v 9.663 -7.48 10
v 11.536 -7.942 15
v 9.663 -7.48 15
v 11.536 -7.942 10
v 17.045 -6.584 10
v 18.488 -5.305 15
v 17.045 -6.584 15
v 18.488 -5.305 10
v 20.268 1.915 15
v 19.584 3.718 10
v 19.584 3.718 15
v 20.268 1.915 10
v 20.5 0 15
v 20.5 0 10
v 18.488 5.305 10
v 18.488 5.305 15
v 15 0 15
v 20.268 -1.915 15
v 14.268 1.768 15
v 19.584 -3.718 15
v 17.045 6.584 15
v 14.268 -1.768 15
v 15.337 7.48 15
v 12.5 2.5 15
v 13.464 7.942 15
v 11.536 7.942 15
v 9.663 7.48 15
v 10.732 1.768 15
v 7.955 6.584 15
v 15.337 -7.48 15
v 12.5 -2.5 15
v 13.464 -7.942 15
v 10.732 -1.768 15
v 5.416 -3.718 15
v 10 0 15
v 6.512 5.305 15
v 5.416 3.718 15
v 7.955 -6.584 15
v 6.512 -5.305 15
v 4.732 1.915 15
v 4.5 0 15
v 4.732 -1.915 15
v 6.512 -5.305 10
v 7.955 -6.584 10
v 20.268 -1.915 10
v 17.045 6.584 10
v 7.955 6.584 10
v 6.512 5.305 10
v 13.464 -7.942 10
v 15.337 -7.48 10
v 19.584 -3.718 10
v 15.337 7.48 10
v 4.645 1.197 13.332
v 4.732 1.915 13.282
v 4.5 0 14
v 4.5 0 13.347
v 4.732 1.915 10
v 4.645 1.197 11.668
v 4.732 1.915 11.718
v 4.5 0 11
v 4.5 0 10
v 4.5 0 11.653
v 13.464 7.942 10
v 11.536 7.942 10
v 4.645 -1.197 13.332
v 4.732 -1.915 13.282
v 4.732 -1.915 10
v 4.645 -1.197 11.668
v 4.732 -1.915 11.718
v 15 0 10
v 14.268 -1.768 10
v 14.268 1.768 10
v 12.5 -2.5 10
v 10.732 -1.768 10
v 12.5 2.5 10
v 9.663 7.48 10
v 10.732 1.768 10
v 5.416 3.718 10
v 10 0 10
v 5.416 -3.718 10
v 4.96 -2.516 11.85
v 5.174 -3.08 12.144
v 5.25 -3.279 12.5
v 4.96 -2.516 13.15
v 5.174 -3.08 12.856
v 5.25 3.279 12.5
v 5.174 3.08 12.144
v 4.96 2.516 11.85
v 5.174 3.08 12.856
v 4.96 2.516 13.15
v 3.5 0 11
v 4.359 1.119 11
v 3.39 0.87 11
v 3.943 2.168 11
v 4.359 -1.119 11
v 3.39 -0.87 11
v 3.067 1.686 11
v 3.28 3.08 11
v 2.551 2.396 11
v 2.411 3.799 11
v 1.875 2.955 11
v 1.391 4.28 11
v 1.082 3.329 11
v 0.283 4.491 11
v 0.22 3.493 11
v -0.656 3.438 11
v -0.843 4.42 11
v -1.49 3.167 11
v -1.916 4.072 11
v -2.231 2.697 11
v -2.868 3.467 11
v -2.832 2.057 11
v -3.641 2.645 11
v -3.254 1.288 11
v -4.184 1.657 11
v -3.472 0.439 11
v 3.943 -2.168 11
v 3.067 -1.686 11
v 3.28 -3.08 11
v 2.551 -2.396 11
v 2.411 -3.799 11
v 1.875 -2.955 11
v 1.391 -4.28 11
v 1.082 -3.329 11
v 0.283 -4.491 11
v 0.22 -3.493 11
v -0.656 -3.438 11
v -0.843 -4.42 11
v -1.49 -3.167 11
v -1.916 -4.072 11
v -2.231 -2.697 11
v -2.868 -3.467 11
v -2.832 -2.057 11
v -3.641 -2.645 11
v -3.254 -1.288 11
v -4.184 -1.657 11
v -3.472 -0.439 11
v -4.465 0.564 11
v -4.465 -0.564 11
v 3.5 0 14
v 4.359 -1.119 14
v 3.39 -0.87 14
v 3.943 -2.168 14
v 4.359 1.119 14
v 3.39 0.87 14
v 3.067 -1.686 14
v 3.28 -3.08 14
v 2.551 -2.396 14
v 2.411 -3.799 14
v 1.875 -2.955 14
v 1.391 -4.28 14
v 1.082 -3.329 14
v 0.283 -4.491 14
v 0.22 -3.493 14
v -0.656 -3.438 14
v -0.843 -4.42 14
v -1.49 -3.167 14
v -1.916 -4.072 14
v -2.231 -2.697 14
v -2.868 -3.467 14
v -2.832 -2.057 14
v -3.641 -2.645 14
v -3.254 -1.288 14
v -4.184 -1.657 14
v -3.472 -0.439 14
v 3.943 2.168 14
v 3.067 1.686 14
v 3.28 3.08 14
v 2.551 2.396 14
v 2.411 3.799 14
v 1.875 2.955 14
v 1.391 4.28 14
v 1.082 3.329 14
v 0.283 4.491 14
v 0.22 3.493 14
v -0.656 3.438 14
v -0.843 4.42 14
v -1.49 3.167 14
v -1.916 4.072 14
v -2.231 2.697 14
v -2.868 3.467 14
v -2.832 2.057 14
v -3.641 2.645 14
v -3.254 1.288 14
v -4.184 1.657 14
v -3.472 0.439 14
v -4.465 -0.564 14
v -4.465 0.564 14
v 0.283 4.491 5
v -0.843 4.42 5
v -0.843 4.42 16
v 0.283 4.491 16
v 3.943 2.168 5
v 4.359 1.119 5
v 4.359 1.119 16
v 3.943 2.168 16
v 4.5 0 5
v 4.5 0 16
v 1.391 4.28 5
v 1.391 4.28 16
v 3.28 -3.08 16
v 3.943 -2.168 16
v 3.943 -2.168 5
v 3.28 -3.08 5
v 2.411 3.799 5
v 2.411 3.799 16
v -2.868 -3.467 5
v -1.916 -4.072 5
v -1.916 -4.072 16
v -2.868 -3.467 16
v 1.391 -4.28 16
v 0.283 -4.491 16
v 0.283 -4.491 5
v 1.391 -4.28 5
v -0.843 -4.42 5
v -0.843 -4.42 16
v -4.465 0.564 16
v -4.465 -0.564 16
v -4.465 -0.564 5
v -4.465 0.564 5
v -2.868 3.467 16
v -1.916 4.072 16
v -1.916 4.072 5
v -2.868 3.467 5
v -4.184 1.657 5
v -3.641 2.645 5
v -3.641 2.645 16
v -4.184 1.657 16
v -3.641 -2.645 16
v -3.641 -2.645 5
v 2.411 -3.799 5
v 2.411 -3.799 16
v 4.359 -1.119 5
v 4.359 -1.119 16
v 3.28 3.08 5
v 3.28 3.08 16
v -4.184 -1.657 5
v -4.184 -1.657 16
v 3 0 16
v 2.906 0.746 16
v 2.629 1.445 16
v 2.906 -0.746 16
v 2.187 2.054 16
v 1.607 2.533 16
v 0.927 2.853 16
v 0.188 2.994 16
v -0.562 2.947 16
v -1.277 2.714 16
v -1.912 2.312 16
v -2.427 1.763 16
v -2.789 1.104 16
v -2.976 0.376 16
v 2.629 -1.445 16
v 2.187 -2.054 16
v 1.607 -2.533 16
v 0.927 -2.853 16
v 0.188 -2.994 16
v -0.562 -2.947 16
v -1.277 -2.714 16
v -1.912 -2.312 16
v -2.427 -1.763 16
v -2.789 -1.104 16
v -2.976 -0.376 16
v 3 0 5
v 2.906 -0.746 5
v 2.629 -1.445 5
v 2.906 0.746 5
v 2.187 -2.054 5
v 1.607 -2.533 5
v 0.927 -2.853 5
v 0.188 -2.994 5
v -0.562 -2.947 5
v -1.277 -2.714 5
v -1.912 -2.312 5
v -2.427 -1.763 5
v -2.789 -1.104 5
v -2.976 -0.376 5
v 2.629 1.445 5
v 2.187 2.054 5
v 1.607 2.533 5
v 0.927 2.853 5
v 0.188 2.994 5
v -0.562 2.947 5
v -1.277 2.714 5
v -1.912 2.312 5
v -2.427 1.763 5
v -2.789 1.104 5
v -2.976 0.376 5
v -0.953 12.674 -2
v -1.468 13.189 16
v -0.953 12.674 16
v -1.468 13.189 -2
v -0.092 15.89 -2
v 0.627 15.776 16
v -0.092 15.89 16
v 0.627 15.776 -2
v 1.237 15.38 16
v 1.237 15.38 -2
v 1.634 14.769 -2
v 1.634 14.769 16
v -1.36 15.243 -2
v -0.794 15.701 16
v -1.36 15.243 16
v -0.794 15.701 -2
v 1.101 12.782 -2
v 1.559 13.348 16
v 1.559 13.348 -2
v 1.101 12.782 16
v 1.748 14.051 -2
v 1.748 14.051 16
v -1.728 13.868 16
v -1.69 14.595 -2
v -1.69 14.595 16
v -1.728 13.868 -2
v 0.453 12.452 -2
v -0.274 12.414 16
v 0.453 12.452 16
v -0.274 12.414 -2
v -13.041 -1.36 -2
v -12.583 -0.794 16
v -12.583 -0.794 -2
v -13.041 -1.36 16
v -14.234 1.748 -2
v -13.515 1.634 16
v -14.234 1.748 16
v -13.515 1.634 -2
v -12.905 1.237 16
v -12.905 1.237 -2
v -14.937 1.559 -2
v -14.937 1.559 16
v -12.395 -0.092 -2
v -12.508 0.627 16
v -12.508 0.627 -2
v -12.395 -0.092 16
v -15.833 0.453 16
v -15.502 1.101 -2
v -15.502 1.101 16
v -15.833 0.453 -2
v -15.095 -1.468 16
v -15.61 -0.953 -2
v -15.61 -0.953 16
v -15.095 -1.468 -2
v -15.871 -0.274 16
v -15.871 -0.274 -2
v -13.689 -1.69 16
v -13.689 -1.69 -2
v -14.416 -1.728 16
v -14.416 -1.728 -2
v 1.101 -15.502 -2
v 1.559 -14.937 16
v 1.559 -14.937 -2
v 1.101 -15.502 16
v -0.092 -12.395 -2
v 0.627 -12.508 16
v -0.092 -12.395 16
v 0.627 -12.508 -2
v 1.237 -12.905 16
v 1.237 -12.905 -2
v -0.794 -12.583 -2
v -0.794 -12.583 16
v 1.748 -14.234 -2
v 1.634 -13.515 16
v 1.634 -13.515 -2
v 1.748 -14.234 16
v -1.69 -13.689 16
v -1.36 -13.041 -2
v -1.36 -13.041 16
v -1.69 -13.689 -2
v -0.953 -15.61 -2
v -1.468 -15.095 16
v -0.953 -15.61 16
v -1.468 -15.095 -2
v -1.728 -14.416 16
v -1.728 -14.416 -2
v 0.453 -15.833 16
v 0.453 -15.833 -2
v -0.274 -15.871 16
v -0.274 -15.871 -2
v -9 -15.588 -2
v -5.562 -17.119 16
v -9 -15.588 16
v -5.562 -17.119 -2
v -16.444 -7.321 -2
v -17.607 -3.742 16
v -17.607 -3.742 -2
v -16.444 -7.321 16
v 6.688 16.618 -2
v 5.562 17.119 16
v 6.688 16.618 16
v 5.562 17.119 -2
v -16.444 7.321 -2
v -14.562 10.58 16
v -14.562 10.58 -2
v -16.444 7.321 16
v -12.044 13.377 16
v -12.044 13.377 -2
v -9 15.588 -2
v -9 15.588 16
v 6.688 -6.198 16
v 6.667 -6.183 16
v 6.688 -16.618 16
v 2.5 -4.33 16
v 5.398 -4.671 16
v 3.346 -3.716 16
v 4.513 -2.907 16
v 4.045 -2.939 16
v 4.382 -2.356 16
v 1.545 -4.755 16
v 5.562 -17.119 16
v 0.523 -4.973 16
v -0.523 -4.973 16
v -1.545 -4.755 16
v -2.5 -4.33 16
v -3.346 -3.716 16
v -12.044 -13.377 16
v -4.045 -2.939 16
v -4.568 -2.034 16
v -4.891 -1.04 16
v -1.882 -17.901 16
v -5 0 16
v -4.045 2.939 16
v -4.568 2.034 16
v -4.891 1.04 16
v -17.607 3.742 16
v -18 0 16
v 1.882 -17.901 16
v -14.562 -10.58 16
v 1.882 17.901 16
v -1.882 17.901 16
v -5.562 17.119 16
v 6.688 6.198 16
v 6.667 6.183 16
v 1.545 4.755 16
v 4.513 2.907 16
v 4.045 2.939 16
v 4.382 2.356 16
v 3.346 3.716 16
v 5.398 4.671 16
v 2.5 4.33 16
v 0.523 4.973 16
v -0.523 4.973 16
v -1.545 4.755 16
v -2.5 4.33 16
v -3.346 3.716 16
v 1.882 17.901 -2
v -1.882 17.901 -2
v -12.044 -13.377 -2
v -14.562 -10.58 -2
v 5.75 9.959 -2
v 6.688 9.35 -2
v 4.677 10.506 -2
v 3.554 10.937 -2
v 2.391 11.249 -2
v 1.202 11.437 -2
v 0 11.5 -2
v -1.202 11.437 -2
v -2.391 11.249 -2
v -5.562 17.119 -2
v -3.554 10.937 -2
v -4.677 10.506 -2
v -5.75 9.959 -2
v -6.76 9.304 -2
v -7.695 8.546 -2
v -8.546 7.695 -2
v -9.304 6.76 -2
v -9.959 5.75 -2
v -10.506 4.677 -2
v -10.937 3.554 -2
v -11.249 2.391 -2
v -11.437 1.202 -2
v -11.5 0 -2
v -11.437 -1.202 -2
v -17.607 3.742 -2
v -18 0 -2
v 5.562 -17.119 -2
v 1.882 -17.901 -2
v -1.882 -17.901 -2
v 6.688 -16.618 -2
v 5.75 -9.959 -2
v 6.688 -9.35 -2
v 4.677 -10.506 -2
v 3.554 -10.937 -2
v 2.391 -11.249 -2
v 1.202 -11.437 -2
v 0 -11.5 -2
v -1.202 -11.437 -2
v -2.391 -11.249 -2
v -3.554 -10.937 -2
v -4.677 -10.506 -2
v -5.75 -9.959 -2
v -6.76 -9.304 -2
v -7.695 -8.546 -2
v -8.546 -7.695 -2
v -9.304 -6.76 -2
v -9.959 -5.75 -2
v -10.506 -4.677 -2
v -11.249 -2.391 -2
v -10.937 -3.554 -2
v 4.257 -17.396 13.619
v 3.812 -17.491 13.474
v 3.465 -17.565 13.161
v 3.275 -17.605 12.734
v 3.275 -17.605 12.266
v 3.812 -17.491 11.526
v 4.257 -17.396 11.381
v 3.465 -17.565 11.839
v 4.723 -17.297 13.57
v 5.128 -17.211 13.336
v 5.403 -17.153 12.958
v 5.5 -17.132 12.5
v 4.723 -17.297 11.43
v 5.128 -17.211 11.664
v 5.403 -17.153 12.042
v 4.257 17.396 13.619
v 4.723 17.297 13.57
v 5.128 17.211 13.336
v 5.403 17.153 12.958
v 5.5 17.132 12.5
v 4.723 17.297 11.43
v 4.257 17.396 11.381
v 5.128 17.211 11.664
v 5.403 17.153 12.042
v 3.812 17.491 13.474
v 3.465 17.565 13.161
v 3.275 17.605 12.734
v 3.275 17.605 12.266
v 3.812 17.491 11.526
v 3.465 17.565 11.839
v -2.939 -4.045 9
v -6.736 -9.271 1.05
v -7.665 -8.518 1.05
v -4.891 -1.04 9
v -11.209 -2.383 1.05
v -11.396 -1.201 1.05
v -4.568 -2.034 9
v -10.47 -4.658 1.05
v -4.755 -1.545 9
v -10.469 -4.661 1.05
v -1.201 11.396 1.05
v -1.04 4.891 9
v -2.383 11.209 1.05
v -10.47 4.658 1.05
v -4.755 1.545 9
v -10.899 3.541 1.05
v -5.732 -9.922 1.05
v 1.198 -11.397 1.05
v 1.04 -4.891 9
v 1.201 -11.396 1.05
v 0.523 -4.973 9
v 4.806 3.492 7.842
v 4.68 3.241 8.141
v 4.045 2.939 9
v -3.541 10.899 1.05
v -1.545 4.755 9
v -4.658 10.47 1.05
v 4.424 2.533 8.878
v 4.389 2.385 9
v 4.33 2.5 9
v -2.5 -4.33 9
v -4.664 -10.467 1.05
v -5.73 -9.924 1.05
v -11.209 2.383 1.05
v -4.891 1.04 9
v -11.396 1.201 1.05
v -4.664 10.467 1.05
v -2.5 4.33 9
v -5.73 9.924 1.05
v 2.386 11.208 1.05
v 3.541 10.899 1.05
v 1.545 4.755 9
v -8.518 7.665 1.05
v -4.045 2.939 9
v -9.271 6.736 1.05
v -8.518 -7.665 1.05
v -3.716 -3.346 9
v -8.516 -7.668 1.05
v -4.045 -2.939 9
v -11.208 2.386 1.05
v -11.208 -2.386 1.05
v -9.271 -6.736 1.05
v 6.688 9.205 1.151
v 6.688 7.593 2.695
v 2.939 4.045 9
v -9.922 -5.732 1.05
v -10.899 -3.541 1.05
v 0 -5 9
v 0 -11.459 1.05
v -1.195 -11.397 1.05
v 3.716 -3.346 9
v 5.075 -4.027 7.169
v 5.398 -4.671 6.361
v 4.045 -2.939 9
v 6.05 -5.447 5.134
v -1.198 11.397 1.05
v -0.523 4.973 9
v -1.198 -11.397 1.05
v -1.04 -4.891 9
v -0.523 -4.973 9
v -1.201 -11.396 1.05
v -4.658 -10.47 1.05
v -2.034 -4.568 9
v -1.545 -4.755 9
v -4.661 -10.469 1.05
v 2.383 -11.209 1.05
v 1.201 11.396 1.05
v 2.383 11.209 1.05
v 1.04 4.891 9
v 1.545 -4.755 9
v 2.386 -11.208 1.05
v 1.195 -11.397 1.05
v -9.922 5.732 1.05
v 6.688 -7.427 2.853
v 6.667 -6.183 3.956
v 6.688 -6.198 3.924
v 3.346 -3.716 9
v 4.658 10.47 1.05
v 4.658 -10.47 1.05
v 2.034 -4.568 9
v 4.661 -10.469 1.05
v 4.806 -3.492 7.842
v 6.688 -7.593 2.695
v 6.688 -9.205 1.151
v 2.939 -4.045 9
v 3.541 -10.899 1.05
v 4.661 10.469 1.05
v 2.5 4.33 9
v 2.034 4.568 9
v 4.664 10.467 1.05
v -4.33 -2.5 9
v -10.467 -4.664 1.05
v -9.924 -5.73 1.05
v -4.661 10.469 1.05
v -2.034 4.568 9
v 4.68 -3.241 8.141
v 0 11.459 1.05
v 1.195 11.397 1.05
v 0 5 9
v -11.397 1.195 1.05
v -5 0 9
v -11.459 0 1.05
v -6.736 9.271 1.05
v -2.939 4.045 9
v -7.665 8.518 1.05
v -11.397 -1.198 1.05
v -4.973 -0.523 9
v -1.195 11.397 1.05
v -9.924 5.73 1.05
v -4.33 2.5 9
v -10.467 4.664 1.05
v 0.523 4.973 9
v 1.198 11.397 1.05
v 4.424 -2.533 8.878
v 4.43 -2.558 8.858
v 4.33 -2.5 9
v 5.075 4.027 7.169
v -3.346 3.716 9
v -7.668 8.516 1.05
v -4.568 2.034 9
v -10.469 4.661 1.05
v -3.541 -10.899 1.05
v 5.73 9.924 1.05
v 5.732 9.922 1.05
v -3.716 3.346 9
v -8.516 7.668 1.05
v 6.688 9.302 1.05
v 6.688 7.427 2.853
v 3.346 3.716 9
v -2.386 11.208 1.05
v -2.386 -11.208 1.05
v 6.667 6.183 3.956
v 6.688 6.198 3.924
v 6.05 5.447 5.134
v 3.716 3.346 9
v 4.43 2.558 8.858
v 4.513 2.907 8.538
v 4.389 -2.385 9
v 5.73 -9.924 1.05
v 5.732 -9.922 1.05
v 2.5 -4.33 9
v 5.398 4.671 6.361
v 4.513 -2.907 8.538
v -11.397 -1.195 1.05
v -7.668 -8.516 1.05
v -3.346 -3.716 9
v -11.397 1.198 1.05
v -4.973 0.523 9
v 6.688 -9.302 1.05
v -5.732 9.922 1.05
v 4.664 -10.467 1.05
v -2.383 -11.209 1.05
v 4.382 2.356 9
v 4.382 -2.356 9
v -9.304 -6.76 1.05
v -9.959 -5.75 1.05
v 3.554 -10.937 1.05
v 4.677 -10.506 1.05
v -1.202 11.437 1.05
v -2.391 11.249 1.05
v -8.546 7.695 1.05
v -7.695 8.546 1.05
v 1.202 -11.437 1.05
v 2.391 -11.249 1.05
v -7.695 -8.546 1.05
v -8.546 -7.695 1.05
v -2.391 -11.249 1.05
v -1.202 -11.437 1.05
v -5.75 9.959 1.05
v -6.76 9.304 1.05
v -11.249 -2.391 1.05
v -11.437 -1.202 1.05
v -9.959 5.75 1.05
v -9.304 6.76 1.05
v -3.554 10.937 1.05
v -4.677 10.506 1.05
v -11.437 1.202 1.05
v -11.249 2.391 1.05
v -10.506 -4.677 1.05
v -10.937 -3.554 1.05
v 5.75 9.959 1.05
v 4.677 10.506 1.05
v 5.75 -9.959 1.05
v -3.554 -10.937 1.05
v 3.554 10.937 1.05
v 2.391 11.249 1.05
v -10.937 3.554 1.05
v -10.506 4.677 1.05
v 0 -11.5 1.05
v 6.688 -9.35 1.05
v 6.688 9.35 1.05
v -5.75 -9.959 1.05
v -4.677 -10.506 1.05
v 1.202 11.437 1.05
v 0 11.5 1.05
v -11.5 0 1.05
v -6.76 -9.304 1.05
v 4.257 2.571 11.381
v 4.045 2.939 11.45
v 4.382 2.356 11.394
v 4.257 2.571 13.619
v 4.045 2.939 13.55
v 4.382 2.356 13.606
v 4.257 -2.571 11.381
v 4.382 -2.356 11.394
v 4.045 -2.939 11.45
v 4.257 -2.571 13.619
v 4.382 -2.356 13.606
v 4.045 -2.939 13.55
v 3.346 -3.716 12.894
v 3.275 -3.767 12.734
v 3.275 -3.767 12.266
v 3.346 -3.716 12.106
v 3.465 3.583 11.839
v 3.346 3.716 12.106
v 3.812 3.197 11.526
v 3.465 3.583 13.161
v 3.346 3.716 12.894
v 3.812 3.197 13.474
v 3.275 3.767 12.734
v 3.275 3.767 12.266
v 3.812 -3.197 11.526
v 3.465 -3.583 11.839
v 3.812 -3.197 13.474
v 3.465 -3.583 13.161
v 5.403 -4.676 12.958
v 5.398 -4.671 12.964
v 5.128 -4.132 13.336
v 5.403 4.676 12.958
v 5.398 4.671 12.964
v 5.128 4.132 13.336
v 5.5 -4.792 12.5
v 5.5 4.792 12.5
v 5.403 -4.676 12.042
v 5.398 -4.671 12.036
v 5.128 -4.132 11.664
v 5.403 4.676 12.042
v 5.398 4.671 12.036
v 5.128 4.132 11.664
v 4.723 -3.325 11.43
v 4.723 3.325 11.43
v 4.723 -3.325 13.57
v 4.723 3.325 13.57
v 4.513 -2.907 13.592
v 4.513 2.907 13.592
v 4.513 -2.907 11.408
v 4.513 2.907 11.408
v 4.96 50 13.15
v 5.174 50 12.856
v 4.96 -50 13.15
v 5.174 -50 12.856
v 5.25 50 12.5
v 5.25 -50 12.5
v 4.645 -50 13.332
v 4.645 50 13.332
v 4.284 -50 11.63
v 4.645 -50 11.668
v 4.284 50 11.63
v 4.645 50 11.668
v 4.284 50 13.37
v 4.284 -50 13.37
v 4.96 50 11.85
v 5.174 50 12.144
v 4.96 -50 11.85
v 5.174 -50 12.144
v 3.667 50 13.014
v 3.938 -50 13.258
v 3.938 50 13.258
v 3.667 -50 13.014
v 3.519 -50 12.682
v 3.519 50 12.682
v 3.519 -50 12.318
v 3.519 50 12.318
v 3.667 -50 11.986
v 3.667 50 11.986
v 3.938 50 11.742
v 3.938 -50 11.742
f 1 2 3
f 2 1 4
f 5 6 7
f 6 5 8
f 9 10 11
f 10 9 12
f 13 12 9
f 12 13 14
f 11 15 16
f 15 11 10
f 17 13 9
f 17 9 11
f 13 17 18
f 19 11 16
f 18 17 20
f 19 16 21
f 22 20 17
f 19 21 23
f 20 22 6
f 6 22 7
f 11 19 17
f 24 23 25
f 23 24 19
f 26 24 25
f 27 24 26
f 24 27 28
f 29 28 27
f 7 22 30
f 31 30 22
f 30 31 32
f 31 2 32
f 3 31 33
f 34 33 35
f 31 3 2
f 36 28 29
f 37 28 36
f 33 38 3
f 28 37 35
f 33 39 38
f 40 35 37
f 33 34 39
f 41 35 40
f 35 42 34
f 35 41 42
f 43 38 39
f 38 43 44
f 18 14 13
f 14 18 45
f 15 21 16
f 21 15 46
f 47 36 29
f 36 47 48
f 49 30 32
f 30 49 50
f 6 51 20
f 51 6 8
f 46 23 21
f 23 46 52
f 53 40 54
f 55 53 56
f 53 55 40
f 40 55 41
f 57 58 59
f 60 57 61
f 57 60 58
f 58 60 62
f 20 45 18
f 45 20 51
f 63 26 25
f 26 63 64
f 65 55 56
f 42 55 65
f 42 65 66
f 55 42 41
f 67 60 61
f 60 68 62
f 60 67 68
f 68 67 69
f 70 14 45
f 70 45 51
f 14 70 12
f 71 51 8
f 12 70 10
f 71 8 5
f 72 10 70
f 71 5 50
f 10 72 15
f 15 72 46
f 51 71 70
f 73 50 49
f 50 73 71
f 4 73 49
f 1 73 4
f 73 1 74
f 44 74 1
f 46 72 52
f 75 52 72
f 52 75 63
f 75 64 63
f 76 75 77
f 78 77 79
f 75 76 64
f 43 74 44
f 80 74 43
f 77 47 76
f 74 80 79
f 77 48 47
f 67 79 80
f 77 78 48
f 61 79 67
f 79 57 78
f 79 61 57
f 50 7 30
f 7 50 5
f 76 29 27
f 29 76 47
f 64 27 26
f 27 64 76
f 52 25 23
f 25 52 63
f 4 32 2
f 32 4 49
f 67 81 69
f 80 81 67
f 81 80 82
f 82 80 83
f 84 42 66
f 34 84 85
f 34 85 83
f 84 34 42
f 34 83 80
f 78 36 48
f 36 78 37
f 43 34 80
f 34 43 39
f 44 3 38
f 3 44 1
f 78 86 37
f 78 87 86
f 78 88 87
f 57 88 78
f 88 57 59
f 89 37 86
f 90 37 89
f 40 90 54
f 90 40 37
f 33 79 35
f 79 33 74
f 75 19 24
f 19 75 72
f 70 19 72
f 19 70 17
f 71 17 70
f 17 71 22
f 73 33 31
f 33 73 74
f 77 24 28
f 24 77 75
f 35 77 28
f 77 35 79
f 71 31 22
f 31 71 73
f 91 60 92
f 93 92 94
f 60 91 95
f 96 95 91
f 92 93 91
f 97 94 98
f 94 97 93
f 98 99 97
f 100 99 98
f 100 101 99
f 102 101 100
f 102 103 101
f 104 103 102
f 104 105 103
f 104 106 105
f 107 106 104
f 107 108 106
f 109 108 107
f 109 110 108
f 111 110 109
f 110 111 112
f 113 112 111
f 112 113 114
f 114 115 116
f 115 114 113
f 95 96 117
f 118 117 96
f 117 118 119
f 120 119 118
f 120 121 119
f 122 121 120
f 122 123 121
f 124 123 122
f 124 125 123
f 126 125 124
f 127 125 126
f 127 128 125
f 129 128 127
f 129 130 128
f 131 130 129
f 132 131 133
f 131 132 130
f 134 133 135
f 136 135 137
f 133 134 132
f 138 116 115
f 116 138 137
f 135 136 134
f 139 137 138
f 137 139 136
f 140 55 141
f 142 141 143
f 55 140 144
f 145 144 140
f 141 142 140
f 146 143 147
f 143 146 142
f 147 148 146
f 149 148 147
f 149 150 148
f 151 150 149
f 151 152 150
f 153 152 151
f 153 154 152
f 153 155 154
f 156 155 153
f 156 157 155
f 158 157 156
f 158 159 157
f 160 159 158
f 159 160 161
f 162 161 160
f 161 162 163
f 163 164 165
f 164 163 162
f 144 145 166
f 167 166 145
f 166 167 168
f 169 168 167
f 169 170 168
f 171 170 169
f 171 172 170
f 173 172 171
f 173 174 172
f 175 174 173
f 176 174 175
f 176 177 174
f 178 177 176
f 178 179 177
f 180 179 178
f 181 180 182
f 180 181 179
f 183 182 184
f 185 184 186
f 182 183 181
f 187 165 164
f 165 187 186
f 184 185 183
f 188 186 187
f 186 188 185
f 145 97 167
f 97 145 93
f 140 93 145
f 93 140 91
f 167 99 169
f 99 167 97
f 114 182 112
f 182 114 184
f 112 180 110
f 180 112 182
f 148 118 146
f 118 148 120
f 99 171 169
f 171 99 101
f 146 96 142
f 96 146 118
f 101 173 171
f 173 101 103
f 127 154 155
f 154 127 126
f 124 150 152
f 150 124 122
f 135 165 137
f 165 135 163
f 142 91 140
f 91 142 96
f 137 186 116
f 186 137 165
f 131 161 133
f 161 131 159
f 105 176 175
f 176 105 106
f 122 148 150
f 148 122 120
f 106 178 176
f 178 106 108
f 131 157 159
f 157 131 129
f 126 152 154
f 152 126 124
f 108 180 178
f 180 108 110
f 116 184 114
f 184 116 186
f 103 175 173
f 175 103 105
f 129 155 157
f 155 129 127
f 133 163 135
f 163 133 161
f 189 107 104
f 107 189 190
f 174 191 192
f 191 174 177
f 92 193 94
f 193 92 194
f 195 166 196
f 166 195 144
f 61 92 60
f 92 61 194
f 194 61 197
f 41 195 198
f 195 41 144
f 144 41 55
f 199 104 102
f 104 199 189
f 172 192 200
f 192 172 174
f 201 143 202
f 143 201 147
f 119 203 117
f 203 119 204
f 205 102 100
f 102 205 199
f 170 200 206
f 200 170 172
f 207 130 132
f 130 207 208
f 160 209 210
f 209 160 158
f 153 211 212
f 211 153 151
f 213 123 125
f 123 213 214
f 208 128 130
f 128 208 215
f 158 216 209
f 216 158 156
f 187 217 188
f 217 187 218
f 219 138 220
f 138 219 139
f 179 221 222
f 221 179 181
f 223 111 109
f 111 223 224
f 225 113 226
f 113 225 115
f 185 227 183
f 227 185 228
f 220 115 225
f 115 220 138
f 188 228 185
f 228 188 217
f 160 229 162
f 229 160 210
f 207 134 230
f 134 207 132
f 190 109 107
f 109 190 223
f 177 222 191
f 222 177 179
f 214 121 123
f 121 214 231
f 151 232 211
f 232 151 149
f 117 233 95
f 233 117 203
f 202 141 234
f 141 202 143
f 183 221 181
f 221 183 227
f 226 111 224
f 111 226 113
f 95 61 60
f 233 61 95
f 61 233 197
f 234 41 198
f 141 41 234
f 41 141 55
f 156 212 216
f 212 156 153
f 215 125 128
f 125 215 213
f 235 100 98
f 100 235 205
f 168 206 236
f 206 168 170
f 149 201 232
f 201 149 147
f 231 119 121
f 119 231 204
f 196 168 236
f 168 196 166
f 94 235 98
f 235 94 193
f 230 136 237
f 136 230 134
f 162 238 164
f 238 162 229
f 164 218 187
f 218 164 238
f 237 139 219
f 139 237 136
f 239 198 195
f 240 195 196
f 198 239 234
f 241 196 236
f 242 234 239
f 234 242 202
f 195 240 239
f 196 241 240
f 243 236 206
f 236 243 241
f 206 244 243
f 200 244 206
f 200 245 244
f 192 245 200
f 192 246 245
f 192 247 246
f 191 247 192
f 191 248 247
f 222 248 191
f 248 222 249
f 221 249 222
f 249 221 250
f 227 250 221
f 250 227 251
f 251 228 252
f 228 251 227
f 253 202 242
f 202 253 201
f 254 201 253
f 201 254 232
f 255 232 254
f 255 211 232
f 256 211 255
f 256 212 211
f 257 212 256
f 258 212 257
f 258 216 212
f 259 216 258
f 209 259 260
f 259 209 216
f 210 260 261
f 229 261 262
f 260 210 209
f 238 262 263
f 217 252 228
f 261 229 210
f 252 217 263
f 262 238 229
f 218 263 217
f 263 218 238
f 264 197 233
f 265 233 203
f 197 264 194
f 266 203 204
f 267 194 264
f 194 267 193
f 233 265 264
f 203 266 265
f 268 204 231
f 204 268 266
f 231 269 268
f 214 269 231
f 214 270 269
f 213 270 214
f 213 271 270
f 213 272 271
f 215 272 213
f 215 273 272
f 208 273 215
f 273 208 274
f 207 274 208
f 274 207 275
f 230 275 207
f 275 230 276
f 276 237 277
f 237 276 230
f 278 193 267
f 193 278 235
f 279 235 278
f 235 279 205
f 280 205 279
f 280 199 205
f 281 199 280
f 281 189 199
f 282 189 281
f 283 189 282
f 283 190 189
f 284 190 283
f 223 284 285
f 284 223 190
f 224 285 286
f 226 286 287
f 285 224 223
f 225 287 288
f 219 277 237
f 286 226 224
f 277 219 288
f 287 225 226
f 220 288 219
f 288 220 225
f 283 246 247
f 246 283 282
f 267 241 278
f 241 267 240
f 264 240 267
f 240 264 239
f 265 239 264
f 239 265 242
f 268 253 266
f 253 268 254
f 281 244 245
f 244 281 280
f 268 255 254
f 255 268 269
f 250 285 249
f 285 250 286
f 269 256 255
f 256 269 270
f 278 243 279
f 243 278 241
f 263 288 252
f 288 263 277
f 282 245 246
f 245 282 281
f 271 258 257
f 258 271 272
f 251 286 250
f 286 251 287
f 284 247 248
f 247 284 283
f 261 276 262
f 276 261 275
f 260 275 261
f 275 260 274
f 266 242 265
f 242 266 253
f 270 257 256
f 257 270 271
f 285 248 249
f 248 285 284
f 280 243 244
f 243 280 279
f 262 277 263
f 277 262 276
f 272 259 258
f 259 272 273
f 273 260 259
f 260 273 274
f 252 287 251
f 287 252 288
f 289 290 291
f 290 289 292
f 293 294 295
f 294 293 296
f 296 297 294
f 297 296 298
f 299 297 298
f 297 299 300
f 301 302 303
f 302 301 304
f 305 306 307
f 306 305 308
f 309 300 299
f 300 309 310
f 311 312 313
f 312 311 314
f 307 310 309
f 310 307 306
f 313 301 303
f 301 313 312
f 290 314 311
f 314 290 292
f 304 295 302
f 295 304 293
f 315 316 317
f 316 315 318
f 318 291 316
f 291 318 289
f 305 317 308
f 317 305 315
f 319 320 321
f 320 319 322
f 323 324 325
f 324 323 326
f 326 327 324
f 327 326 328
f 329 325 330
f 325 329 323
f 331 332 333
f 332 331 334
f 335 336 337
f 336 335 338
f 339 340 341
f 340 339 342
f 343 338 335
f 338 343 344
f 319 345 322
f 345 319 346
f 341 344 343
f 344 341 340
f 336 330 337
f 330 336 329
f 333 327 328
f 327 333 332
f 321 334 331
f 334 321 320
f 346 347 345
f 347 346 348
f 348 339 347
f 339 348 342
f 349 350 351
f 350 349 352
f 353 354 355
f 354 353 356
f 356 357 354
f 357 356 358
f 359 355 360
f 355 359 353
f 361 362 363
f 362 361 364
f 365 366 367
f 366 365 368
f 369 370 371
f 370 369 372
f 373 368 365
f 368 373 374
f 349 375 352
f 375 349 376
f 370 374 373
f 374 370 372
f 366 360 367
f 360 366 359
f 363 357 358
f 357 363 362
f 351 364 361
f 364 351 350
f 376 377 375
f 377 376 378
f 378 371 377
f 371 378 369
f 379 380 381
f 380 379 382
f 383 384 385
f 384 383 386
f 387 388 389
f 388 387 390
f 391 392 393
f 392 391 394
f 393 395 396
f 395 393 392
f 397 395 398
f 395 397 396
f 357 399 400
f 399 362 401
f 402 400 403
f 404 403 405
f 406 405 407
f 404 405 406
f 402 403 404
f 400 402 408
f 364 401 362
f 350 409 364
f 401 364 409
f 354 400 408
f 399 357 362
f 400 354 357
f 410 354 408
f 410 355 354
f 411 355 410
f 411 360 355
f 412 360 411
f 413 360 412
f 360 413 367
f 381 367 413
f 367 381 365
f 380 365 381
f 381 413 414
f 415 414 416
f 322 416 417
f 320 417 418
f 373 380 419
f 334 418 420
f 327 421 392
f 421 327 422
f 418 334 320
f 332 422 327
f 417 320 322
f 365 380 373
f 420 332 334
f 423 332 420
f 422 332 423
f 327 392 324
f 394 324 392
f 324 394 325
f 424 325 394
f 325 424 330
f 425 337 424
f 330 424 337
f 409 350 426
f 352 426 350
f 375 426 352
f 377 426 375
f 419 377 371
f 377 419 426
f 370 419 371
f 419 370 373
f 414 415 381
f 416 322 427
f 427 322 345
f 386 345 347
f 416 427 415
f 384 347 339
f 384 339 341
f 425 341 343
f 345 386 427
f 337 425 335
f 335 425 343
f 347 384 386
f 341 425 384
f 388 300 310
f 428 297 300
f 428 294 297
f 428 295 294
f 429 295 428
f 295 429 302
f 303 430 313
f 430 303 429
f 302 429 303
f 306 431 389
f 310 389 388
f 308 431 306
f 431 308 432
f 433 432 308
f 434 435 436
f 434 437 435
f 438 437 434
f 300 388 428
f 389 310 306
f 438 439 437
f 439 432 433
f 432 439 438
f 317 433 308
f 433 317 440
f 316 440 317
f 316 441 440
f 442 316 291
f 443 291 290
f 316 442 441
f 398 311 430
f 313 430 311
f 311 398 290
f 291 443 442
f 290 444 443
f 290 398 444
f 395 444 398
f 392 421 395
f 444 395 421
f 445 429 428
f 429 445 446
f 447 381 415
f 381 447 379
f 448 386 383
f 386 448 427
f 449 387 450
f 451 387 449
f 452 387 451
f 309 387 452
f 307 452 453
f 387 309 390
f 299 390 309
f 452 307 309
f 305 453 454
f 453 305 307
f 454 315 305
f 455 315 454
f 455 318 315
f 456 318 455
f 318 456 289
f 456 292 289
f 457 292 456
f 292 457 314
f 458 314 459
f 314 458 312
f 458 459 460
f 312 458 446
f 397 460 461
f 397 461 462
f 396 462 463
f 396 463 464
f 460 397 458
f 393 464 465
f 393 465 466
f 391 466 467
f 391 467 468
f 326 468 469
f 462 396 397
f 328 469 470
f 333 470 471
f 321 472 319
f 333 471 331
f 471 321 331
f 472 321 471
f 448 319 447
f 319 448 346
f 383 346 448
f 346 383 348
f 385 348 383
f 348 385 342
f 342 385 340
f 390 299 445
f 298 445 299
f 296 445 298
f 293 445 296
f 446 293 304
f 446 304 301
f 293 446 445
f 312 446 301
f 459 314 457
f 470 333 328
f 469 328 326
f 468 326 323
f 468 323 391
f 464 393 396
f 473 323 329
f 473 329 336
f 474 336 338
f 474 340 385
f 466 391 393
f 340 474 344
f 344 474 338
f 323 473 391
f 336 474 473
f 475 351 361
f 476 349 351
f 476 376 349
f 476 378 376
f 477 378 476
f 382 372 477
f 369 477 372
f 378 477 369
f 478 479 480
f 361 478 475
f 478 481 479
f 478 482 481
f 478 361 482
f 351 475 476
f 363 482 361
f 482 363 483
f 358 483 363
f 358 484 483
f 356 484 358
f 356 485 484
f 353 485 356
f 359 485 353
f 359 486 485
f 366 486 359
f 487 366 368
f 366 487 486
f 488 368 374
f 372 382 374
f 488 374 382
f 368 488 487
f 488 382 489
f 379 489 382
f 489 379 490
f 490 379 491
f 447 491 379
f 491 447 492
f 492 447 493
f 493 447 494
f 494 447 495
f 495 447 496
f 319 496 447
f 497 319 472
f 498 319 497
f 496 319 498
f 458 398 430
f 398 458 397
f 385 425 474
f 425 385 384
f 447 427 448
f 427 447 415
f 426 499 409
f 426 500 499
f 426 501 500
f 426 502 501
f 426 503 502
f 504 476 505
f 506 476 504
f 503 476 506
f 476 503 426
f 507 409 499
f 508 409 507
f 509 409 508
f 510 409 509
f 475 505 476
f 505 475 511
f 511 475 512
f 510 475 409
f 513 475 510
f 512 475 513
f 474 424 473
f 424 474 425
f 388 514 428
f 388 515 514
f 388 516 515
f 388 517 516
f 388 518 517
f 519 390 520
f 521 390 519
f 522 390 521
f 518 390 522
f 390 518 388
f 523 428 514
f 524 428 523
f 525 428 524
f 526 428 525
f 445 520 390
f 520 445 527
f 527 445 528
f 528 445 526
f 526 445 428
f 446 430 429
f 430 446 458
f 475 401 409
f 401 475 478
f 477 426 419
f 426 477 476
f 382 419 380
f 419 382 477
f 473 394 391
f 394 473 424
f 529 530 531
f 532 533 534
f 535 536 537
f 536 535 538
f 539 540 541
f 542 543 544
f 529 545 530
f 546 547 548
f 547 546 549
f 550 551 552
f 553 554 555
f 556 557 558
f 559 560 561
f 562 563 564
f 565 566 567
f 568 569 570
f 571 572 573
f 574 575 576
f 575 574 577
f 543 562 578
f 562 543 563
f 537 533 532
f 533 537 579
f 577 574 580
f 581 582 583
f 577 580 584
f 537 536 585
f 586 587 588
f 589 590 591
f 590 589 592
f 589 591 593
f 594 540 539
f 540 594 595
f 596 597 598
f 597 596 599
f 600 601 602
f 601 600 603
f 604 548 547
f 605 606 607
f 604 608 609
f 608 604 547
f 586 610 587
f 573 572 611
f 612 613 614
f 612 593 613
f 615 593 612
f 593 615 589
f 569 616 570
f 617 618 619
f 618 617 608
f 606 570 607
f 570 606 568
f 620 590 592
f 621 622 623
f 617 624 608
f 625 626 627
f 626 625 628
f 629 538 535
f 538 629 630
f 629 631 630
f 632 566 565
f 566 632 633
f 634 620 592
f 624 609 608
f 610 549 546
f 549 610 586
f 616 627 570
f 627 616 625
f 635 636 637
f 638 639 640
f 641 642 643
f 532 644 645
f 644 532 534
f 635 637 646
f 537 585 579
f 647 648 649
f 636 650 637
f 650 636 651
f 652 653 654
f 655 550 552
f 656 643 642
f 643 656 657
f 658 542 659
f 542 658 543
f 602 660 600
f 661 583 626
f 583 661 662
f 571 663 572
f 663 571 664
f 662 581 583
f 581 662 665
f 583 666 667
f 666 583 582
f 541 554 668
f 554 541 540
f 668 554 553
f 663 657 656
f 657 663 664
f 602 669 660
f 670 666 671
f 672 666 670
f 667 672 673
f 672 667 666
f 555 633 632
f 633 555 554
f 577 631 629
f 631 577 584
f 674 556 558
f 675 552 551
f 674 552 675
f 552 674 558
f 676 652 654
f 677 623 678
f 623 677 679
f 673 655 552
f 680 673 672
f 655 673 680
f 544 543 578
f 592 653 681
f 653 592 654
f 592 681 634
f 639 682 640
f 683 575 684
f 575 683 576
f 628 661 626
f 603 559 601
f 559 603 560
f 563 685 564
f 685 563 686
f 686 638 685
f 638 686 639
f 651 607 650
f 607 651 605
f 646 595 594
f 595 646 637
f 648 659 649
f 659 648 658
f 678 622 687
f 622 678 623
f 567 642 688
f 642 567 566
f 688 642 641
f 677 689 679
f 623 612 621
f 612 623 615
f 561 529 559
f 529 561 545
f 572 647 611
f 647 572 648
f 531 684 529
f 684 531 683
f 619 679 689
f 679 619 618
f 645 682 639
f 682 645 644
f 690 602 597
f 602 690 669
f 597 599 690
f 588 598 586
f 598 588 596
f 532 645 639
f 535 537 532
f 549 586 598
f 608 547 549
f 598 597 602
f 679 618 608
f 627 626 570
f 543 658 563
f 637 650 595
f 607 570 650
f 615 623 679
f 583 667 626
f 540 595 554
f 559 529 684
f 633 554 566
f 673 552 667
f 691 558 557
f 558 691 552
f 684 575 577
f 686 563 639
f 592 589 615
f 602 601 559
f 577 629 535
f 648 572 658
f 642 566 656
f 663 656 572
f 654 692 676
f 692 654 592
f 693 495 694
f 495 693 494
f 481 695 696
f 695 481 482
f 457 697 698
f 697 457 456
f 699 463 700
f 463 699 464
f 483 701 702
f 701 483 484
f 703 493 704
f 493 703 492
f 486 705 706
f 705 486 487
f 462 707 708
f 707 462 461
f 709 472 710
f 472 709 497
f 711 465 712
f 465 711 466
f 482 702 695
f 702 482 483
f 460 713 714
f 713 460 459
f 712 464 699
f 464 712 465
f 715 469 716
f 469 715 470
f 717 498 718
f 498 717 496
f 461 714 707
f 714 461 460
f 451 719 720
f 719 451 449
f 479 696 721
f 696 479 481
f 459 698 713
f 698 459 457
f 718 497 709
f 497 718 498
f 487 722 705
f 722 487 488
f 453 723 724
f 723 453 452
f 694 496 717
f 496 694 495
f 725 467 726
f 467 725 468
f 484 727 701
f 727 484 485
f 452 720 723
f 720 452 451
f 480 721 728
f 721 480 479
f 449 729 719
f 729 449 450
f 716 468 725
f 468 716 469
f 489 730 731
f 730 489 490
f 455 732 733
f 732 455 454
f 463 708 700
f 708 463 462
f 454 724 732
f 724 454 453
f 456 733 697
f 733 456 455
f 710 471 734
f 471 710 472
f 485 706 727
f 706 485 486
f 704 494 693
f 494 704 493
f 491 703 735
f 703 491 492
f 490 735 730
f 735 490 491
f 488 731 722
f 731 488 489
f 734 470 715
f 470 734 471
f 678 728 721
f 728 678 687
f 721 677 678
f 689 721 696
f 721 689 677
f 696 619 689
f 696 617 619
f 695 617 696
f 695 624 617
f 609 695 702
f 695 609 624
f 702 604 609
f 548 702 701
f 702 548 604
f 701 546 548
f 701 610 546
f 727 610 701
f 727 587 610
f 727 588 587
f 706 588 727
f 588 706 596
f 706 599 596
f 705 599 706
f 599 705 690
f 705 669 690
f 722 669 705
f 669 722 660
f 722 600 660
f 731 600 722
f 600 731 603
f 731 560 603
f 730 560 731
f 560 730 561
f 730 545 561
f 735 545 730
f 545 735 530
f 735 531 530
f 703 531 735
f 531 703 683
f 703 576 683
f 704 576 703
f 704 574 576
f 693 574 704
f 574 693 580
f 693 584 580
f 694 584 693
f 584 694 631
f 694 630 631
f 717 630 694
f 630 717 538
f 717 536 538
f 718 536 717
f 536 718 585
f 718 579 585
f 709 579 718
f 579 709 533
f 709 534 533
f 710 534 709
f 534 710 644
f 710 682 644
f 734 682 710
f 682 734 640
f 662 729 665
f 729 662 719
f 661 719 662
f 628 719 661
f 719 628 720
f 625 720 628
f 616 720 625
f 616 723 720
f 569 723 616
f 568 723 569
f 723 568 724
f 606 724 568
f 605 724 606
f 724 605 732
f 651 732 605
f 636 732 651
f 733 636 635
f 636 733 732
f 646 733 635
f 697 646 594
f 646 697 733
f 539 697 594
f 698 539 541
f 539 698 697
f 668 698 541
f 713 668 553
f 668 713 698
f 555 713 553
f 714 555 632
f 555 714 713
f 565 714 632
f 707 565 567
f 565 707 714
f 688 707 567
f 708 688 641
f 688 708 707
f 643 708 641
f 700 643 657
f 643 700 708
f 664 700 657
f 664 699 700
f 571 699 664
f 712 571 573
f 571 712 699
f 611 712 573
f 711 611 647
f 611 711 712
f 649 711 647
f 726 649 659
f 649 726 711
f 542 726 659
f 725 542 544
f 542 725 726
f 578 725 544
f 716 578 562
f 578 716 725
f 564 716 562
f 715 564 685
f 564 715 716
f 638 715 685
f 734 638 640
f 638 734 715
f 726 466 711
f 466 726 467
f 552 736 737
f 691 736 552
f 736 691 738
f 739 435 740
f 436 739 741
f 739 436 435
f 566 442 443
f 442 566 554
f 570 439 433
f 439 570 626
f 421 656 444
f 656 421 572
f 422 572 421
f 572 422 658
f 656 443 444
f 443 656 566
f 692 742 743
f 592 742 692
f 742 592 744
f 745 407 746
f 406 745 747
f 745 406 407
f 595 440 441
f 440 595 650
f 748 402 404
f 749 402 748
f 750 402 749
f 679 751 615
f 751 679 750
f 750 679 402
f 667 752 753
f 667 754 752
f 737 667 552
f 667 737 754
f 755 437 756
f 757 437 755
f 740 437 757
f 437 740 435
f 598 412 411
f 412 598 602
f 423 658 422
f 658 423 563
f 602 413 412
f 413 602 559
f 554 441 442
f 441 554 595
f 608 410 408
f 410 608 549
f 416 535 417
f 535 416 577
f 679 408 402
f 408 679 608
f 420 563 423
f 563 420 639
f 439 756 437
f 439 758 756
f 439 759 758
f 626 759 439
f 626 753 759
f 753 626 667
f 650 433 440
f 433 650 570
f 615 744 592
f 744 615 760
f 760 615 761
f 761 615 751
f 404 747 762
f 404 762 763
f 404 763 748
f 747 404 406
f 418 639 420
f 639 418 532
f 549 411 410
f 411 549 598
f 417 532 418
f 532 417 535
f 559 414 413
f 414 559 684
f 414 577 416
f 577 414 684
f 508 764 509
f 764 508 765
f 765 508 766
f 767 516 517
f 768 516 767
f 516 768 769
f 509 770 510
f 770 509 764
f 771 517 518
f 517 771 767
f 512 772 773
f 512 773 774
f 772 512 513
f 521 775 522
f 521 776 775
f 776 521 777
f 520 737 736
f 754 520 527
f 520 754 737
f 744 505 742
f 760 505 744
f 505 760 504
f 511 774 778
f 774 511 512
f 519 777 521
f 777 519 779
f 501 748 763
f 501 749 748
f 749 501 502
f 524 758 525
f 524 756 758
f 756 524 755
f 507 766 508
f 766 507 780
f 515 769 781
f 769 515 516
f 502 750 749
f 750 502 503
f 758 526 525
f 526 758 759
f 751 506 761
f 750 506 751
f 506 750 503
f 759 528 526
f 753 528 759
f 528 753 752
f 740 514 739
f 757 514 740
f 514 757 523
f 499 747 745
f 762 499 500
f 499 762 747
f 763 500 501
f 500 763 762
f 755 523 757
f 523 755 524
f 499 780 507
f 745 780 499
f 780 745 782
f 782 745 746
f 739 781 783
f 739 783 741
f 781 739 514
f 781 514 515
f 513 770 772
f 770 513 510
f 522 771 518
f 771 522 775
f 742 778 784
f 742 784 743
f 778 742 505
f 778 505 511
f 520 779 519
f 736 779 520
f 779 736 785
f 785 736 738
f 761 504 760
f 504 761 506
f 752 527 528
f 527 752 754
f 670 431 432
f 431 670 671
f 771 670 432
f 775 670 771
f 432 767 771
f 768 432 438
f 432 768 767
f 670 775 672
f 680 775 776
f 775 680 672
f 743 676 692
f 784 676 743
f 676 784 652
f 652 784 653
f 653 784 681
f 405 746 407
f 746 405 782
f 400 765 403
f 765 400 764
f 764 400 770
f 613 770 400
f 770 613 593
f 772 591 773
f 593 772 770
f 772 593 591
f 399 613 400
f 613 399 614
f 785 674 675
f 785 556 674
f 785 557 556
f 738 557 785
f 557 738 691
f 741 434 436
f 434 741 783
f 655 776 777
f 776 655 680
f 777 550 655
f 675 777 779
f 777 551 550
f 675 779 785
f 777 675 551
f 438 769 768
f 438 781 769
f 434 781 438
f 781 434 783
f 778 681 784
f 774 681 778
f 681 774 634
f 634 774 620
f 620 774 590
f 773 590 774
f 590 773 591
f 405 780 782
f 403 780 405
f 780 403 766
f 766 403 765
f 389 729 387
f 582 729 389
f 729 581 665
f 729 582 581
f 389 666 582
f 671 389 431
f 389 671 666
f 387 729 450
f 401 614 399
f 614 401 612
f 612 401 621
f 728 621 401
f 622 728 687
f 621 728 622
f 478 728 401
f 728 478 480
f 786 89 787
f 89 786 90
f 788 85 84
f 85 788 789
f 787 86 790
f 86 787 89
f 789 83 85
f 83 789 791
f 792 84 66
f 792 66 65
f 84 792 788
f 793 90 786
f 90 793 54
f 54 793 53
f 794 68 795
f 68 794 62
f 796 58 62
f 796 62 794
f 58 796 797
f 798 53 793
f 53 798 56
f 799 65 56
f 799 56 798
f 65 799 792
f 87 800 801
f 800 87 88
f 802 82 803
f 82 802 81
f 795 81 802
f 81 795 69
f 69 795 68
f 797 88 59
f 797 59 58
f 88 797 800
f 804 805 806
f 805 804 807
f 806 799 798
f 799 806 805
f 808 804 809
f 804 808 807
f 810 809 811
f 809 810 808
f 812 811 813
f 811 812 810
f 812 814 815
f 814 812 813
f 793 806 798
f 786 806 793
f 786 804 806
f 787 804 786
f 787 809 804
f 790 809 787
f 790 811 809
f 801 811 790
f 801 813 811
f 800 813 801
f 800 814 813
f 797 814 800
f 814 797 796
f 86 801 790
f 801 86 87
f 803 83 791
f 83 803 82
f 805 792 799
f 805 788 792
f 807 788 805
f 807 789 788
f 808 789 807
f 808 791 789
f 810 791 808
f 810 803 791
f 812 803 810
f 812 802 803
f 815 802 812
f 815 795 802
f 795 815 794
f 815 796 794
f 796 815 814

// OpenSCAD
// Variables
bearing_outer_diameter = 16;
bearing_inner_diameter = 5;
bearing_height = 5;
bearing_clearing = 1;

drive_outer_diameter = 9;
drive_inner_diameter = 6;
drive_height = 11;
drive_driver_diameter = 7;
drive_driver_height = 3;
drive_driver_position = 6; // From the bottom to the bottom of driver

motor_diameter = 36;
motor_height = 22.7;
motor_shank_diameter = 22;
motor_shank_height = 2;
motor_shaft_diameter = drive_inner_diameter;
motor_shaft_height = 16;
motor_mounting_screw_diameter = 3;
motor_mounting_screw_length = motor_shaft_height + motor_shank_height;
motor_mounting_screw_distance = 20; // center to center

pneumatic_screw_diameter = 4;
pneumatic_screw_height = 4;

filament_diameter = 1.75;

module extruder_main() {
	difference() {
		//basic clearing
		translate([0,0,-motor_shank_height])
			cylinder(d=motor_diameter,h=motor_shaft_height+motor_shank_height);
		translate([0,0,1])
			cylinder(d2=drive_outer_diameter+1, d1=motor_shank_diameter+1, h=motor_shaft_height-drive_height+drive_driver_position-3, $fn=60);
		translate([0,0,0-motor_shank_height-0.05])
			cylinder(d=motor_shank_diameter+1, h=motor_shank_height+1.10, $fn=60);
		//driver
		translate([0,0,motor_shaft_height-drive_height+drive_driver_position-3])
			cylinder(d=drive_outer_diameter+1, h=drive_height, $fn=30);

		//filament
		rotate([90,0,0])
			translate([
					(drive_driver_diameter/2)+(filament_diameter/2),
					(motor_shaft_height - drive_height)+drive_driver_position+(drive_driver_height/2),
					-50])
				cylinder(d=filament_diameter+0.5, h= 100, $fn=15);
		//bearing clearing
		translate([
		bearing_outer_diameter/2+drive_outer_diameter/2, 0,0]) {
			cylinder(d=bearing_outer_diameter+1, h=motor_shaft_height+motor_shank_height);
		}
		//divider
		translate([drive_driver_diameter/2+filament_diameter/4+(bearing_outer_diameter-bearing_inner_diameter)/4,-motor_diameter/2-1,-motor_shank_height-1])
			cube([motor_height,motor_diameter+2,motor_height]);
		//screws
		rotate([0,0,45]) {
			translate([motor_mounting_screw_distance/2, motor_mounting_screw_distance/2, 0-motor_shank_height-1])
				cylinder(d=motor_mounting_screw_diameter+0.5, h=motor_mounting_screw_length+2, $fn=15);
			translate([0-motor_mounting_screw_distance/2, motor_mounting_screw_distance/2, 0-motor_shank_height-1])
				cylinder(d=motor_mounting_screw_diameter+0.5, h=motor_mounting_screw_length+2, $fn=15);
			translate([0-motor_mounting_screw_distance/2, 0-motor_mounting_screw_distance/2, 0-motor_shank_height-1])
				cylinder(d=motor_mounting_screw_diameter+0.5, h=motor_mounting_screw_length+2, $fn=15);
		}
		//tube-adapter
		// TODO add the tube adapters


	}
}

module bearing() {
	translate([
		bearing_outer_diameter/2+drive_outer_diameter/2, 0, motor_shaft_height-drive_height + drive_driver_position+(drive_driver_height/2)-bearing_height/2]) {
		difference() {
			cylinder(d=bearing_outer_diameter, h=bearing_height);
			translate([0,0,-1]) 
				cylinder(d=bearing_inner_diameter, h=bearing_height+2);
		}
	}
}

module drive() {
	translate([0,0,motor_shaft_height - drive_height]) {
		difference() {
			cylinder(d=drive_outer_diameter, h=drive_height, $fn=25);
			translate([0,0,-0.1])
				cylinder(d=drive_inner_diameter, h=drive_height + 2, $fn=25);
			difference() {
				translate([0,0,drive_driver_position]) 
					cylinder(d=drive_outer_diameter + 1, h=drive_driver_height, $fn=25);
				translate([0,0,drive_driver_position]) 
					cylinder(d=drive_driver_diameter, h=drive_driver_height, $fn=25);
			}
		}
	}
}

module filament() {
	color("red") {
	rotate([90,0,0]) 
		translate([
			(drive_driver_diameter/2)+(filament_diameter/2),
			(motor_shaft_height - drive_height)+drive_driver_position+(drive_driver_height/2),
			-50])
		cylinder(d=filament_diameter, h= 100, $fn=15);
	}
}

module motor_mounting_scew() {
		cylinder(d=motor_mounting_screw_diameter, h=motor_mounting_screw_length, $fn=15);
		translate([0,0,motor_mounting_screw_length])
			cylinder(d=motor_mounting_screw_diameter*1.5, h=motor_mounting_screw_diameter, $fn=15);
}

module motor() {
	color("silver", 1) {
		rotate([0,0,45]) {
			union() {
				difference() {
					union() {
						translate([0,0,0-motor_height - motor_shank_height]) {
							cylinder(d=motor_diameter, h=motor_height, $fn=60);
							translate([0,0,motor_height]) 
								cylinder(d=motor_shank_diameter, h=motor_shank_height, $fn=50);
							translate([0,0,motor_height + motor_shank_height]) 
								cylinder(d=motor_shaft_diameter, h=motor_shaft_height, $fn=30);
						}
					}
					translate([1.5,-5,2])
						cube([10,10,motor_shaft_height]);
				}
				translate([motor_mounting_screw_distance/2, motor_mounting_screw_distance/2, 0-motor_shank_height])
					motor_mounting_scew();
				translate([0-motor_mounting_screw_distance/2, motor_mounting_screw_distance/2, 0-motor_shank_height])
						motor_mounting_scew();
				translate([0-motor_mounting_screw_distance/2, 0-motor_mounting_screw_distance/2, 0-motor_shank_height])
						motor_mounting_scew();
			}
		}
	}
}

//motor();
filament();
bearing();
drive();
extruder_main();
